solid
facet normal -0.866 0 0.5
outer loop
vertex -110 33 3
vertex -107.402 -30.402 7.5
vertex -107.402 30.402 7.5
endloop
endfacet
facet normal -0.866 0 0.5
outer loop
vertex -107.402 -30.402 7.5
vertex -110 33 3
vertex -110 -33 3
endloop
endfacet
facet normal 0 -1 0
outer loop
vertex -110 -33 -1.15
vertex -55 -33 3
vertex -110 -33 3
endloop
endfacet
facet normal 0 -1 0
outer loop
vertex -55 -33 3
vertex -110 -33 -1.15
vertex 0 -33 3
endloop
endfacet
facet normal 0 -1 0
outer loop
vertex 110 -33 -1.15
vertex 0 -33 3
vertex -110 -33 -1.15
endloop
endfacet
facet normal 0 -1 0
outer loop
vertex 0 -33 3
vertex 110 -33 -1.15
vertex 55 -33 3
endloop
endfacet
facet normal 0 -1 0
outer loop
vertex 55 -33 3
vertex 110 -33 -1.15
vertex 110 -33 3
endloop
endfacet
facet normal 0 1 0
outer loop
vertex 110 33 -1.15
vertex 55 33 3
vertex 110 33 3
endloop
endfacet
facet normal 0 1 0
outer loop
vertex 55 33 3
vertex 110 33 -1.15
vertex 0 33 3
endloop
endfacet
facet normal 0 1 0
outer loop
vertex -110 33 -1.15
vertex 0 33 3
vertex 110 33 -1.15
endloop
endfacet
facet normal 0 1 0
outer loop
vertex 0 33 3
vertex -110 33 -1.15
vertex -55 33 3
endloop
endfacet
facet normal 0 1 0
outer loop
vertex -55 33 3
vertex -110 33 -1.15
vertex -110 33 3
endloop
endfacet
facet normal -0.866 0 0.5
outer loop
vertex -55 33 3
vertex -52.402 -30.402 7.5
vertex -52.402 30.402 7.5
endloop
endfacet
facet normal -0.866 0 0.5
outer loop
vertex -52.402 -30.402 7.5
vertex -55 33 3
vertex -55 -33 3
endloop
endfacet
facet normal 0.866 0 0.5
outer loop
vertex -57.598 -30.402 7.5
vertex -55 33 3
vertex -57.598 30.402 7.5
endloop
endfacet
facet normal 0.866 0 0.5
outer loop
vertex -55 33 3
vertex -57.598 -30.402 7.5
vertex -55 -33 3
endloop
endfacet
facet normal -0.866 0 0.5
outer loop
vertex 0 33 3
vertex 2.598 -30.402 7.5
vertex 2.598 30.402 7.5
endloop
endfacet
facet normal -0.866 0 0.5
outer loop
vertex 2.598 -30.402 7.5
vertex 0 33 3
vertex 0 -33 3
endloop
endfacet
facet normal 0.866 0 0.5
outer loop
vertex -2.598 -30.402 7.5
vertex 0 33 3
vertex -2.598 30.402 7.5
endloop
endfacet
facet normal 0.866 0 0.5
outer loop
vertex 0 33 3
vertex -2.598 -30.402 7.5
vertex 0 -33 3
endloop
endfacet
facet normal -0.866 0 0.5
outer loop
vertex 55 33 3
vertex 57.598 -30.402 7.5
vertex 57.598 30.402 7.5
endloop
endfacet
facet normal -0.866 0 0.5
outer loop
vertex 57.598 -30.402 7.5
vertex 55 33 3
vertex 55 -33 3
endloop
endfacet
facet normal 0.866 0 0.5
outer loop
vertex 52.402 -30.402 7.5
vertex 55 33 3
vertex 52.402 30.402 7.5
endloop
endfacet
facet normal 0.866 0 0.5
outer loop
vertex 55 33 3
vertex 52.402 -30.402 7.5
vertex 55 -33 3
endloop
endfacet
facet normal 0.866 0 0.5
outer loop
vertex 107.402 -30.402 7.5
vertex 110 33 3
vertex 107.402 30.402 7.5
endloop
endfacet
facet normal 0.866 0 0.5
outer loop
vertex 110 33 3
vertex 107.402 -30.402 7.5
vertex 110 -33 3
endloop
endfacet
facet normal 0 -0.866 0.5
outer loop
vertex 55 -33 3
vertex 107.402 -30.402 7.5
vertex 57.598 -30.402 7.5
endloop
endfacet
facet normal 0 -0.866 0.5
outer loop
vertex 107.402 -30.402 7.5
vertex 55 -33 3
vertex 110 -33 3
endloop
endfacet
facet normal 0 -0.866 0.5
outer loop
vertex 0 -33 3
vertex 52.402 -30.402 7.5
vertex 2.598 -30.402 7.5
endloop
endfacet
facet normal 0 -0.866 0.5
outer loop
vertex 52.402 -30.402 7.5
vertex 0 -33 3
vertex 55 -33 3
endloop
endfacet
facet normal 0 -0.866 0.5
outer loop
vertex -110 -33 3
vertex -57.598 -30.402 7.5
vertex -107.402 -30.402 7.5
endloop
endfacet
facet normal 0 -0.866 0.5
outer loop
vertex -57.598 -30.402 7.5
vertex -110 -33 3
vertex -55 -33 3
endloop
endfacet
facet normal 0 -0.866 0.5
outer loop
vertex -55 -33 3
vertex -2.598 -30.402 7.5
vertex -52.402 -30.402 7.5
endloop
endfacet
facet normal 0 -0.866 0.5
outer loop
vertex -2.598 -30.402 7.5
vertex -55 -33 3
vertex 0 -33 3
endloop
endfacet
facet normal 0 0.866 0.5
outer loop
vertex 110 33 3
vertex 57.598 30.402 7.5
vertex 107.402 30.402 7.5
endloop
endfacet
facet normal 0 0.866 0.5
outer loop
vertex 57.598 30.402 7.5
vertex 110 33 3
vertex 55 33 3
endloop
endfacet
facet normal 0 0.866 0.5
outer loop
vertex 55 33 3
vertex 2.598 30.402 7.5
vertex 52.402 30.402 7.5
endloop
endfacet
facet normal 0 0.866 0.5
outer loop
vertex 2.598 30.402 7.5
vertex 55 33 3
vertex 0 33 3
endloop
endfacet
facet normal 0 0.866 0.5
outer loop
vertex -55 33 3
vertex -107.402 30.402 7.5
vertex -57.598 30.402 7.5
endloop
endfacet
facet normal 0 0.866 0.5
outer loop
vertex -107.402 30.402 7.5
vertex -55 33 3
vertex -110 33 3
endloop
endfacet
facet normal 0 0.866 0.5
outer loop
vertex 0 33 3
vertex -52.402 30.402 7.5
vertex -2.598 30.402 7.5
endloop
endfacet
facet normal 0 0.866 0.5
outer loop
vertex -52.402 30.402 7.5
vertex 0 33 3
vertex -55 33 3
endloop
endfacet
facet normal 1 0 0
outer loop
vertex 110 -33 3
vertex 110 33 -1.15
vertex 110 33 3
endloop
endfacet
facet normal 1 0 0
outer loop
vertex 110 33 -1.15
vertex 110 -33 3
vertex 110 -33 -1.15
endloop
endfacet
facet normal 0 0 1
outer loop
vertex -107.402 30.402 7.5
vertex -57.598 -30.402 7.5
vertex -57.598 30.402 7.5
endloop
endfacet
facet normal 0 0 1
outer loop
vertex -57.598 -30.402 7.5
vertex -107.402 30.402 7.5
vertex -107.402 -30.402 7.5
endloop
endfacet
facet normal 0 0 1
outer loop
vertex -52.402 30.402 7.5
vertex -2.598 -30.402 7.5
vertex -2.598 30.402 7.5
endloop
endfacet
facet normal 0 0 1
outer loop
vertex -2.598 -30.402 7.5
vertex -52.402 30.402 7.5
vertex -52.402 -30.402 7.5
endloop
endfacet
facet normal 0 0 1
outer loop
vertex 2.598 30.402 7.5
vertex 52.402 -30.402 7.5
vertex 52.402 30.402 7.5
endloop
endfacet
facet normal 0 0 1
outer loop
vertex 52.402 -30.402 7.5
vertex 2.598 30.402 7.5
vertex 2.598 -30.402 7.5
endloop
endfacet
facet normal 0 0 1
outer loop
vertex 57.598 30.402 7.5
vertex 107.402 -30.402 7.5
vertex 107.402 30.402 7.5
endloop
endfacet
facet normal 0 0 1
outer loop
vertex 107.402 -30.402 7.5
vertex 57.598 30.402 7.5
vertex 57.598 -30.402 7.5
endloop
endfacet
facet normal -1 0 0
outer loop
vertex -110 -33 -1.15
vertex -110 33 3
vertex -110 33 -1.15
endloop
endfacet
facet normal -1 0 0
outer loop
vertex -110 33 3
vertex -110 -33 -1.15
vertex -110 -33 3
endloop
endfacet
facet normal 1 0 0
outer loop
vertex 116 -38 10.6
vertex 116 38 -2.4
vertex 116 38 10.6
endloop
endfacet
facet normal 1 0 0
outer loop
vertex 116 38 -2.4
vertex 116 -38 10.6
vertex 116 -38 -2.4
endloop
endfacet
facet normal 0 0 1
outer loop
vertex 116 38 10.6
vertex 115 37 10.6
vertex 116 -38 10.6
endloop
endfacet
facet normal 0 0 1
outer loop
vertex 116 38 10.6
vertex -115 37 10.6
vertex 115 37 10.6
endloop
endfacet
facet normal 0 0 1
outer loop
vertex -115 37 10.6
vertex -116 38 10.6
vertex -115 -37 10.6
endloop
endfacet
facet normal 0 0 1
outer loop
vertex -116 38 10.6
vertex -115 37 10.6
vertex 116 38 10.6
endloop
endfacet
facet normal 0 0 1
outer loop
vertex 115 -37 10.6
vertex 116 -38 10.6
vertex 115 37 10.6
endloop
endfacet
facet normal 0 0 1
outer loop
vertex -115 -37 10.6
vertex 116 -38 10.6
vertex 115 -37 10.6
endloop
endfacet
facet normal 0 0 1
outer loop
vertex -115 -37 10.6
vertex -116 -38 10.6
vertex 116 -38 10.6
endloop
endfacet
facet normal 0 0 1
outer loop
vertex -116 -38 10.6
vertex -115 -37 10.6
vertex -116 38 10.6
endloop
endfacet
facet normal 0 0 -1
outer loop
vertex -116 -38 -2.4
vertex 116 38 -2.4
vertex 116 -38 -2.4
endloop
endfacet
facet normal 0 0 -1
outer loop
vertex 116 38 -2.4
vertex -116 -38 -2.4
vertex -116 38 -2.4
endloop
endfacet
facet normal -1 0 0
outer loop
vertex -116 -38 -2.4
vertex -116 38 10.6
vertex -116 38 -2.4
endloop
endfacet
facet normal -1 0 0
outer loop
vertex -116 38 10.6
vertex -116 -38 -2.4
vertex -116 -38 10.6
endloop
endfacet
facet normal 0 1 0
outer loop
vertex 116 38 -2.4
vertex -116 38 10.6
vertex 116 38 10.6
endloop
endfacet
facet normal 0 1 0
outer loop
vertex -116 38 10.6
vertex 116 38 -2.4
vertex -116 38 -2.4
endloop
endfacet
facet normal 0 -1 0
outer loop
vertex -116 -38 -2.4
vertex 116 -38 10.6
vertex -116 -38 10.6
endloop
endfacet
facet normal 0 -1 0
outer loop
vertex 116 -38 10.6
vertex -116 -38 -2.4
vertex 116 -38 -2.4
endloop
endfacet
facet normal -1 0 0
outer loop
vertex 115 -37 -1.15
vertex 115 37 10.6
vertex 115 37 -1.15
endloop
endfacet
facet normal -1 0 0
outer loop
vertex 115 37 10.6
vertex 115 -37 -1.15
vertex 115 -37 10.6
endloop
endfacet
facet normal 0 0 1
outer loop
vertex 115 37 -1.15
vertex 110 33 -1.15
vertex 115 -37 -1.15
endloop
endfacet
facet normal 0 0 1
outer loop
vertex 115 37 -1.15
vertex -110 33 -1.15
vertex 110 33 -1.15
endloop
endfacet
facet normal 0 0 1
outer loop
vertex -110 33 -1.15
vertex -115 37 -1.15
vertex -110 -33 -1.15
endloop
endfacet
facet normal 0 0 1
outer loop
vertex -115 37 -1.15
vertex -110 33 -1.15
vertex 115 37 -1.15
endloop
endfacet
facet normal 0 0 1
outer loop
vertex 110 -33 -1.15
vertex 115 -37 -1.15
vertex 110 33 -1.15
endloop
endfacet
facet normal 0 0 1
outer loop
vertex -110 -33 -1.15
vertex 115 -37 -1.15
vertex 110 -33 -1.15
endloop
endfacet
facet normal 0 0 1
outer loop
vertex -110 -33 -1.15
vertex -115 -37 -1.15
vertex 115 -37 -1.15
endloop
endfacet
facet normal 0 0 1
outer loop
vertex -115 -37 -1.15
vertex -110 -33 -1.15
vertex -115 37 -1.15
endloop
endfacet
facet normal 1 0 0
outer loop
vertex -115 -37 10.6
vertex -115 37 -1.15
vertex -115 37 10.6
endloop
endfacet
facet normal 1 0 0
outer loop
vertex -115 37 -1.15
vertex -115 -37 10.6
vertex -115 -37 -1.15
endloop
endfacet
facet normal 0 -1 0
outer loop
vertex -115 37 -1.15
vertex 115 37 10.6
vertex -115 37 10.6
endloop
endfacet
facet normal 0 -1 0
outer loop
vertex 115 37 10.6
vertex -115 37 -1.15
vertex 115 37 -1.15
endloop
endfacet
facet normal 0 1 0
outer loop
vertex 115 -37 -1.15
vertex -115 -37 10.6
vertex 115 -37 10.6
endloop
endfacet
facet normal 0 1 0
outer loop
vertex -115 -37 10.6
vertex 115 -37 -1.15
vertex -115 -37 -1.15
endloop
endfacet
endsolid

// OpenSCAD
use <../Write.scad>

// set your desired logo here. See below for supported logo functions
module logo(){
	logo_chaosknoten();
	//logo_cthulhu();
	//logo_usbknoten();
}

// piece width and height - not fully supported yet, do not change
pch=55;
pcw=66;

module logo_chaosknoten(){
	translate([5.7,-6,1.6]) scale([7,7,1]) rotate([0,0,90])
		linear_extrude(height = 1, center = true, convexity = 10)
		import (file = "chaosknoten.dxf");
}

module logo_cthulhu(){
	translate([-33.5,-8.1,1.6]) scale([1.1,1.1,1]) rotate([0,0,0])
		linear_extrude(height = 1, center = true, convexity = 10)
		import (file = "cthulhu.dxf");
}

module logo_usbknoten(){
	translate([5.7,-6,1.6]) scale([7,7,1]) rotate([0,0,90])
		linear_extrude(height = 1, center = true, convexity = 10)
		import (file = "usbknoten.dxf");
}

module tafel(){
	difference() {
		translate([0,0,2.75]) cube([4*pch,pcw,9.5], center=true);
		for (i = [-2:2]){
			translate([i*pch,0,8]) rotate([90,90,0]) cylinder(h=pcw, r=5, center=true, $fn=3);
		}
		for (i = [-1,1]){
			translate([0,i*pcw/2,8]) rotate([0,90,0]) cylinder(h=4*pch, r=5, center=true, $fn=3);
		}
	}
	for (i = [-1:2]){
		translate([i*pch-15,-20,6]) logo();
	}
}

module giessform(){
	translate([0,0,4.1]) difference() {
		cube([4*pch+12,pcw+10,13], center=true);
		translate([0,0,1]) cube([4*pch+10,pcw+8,12.5], center=true);
	}
	translate([pch*1.7,35,-1.4]) scale([0.8,0.8,1])
		rotate([-90,180,0]) writecube("CCCD v1.2", [0,0,0], 0);
}

module alles(gf){
	union(){
		tafel();
		if (gf){
			giessform();
		}
	}
}


alles(true);
